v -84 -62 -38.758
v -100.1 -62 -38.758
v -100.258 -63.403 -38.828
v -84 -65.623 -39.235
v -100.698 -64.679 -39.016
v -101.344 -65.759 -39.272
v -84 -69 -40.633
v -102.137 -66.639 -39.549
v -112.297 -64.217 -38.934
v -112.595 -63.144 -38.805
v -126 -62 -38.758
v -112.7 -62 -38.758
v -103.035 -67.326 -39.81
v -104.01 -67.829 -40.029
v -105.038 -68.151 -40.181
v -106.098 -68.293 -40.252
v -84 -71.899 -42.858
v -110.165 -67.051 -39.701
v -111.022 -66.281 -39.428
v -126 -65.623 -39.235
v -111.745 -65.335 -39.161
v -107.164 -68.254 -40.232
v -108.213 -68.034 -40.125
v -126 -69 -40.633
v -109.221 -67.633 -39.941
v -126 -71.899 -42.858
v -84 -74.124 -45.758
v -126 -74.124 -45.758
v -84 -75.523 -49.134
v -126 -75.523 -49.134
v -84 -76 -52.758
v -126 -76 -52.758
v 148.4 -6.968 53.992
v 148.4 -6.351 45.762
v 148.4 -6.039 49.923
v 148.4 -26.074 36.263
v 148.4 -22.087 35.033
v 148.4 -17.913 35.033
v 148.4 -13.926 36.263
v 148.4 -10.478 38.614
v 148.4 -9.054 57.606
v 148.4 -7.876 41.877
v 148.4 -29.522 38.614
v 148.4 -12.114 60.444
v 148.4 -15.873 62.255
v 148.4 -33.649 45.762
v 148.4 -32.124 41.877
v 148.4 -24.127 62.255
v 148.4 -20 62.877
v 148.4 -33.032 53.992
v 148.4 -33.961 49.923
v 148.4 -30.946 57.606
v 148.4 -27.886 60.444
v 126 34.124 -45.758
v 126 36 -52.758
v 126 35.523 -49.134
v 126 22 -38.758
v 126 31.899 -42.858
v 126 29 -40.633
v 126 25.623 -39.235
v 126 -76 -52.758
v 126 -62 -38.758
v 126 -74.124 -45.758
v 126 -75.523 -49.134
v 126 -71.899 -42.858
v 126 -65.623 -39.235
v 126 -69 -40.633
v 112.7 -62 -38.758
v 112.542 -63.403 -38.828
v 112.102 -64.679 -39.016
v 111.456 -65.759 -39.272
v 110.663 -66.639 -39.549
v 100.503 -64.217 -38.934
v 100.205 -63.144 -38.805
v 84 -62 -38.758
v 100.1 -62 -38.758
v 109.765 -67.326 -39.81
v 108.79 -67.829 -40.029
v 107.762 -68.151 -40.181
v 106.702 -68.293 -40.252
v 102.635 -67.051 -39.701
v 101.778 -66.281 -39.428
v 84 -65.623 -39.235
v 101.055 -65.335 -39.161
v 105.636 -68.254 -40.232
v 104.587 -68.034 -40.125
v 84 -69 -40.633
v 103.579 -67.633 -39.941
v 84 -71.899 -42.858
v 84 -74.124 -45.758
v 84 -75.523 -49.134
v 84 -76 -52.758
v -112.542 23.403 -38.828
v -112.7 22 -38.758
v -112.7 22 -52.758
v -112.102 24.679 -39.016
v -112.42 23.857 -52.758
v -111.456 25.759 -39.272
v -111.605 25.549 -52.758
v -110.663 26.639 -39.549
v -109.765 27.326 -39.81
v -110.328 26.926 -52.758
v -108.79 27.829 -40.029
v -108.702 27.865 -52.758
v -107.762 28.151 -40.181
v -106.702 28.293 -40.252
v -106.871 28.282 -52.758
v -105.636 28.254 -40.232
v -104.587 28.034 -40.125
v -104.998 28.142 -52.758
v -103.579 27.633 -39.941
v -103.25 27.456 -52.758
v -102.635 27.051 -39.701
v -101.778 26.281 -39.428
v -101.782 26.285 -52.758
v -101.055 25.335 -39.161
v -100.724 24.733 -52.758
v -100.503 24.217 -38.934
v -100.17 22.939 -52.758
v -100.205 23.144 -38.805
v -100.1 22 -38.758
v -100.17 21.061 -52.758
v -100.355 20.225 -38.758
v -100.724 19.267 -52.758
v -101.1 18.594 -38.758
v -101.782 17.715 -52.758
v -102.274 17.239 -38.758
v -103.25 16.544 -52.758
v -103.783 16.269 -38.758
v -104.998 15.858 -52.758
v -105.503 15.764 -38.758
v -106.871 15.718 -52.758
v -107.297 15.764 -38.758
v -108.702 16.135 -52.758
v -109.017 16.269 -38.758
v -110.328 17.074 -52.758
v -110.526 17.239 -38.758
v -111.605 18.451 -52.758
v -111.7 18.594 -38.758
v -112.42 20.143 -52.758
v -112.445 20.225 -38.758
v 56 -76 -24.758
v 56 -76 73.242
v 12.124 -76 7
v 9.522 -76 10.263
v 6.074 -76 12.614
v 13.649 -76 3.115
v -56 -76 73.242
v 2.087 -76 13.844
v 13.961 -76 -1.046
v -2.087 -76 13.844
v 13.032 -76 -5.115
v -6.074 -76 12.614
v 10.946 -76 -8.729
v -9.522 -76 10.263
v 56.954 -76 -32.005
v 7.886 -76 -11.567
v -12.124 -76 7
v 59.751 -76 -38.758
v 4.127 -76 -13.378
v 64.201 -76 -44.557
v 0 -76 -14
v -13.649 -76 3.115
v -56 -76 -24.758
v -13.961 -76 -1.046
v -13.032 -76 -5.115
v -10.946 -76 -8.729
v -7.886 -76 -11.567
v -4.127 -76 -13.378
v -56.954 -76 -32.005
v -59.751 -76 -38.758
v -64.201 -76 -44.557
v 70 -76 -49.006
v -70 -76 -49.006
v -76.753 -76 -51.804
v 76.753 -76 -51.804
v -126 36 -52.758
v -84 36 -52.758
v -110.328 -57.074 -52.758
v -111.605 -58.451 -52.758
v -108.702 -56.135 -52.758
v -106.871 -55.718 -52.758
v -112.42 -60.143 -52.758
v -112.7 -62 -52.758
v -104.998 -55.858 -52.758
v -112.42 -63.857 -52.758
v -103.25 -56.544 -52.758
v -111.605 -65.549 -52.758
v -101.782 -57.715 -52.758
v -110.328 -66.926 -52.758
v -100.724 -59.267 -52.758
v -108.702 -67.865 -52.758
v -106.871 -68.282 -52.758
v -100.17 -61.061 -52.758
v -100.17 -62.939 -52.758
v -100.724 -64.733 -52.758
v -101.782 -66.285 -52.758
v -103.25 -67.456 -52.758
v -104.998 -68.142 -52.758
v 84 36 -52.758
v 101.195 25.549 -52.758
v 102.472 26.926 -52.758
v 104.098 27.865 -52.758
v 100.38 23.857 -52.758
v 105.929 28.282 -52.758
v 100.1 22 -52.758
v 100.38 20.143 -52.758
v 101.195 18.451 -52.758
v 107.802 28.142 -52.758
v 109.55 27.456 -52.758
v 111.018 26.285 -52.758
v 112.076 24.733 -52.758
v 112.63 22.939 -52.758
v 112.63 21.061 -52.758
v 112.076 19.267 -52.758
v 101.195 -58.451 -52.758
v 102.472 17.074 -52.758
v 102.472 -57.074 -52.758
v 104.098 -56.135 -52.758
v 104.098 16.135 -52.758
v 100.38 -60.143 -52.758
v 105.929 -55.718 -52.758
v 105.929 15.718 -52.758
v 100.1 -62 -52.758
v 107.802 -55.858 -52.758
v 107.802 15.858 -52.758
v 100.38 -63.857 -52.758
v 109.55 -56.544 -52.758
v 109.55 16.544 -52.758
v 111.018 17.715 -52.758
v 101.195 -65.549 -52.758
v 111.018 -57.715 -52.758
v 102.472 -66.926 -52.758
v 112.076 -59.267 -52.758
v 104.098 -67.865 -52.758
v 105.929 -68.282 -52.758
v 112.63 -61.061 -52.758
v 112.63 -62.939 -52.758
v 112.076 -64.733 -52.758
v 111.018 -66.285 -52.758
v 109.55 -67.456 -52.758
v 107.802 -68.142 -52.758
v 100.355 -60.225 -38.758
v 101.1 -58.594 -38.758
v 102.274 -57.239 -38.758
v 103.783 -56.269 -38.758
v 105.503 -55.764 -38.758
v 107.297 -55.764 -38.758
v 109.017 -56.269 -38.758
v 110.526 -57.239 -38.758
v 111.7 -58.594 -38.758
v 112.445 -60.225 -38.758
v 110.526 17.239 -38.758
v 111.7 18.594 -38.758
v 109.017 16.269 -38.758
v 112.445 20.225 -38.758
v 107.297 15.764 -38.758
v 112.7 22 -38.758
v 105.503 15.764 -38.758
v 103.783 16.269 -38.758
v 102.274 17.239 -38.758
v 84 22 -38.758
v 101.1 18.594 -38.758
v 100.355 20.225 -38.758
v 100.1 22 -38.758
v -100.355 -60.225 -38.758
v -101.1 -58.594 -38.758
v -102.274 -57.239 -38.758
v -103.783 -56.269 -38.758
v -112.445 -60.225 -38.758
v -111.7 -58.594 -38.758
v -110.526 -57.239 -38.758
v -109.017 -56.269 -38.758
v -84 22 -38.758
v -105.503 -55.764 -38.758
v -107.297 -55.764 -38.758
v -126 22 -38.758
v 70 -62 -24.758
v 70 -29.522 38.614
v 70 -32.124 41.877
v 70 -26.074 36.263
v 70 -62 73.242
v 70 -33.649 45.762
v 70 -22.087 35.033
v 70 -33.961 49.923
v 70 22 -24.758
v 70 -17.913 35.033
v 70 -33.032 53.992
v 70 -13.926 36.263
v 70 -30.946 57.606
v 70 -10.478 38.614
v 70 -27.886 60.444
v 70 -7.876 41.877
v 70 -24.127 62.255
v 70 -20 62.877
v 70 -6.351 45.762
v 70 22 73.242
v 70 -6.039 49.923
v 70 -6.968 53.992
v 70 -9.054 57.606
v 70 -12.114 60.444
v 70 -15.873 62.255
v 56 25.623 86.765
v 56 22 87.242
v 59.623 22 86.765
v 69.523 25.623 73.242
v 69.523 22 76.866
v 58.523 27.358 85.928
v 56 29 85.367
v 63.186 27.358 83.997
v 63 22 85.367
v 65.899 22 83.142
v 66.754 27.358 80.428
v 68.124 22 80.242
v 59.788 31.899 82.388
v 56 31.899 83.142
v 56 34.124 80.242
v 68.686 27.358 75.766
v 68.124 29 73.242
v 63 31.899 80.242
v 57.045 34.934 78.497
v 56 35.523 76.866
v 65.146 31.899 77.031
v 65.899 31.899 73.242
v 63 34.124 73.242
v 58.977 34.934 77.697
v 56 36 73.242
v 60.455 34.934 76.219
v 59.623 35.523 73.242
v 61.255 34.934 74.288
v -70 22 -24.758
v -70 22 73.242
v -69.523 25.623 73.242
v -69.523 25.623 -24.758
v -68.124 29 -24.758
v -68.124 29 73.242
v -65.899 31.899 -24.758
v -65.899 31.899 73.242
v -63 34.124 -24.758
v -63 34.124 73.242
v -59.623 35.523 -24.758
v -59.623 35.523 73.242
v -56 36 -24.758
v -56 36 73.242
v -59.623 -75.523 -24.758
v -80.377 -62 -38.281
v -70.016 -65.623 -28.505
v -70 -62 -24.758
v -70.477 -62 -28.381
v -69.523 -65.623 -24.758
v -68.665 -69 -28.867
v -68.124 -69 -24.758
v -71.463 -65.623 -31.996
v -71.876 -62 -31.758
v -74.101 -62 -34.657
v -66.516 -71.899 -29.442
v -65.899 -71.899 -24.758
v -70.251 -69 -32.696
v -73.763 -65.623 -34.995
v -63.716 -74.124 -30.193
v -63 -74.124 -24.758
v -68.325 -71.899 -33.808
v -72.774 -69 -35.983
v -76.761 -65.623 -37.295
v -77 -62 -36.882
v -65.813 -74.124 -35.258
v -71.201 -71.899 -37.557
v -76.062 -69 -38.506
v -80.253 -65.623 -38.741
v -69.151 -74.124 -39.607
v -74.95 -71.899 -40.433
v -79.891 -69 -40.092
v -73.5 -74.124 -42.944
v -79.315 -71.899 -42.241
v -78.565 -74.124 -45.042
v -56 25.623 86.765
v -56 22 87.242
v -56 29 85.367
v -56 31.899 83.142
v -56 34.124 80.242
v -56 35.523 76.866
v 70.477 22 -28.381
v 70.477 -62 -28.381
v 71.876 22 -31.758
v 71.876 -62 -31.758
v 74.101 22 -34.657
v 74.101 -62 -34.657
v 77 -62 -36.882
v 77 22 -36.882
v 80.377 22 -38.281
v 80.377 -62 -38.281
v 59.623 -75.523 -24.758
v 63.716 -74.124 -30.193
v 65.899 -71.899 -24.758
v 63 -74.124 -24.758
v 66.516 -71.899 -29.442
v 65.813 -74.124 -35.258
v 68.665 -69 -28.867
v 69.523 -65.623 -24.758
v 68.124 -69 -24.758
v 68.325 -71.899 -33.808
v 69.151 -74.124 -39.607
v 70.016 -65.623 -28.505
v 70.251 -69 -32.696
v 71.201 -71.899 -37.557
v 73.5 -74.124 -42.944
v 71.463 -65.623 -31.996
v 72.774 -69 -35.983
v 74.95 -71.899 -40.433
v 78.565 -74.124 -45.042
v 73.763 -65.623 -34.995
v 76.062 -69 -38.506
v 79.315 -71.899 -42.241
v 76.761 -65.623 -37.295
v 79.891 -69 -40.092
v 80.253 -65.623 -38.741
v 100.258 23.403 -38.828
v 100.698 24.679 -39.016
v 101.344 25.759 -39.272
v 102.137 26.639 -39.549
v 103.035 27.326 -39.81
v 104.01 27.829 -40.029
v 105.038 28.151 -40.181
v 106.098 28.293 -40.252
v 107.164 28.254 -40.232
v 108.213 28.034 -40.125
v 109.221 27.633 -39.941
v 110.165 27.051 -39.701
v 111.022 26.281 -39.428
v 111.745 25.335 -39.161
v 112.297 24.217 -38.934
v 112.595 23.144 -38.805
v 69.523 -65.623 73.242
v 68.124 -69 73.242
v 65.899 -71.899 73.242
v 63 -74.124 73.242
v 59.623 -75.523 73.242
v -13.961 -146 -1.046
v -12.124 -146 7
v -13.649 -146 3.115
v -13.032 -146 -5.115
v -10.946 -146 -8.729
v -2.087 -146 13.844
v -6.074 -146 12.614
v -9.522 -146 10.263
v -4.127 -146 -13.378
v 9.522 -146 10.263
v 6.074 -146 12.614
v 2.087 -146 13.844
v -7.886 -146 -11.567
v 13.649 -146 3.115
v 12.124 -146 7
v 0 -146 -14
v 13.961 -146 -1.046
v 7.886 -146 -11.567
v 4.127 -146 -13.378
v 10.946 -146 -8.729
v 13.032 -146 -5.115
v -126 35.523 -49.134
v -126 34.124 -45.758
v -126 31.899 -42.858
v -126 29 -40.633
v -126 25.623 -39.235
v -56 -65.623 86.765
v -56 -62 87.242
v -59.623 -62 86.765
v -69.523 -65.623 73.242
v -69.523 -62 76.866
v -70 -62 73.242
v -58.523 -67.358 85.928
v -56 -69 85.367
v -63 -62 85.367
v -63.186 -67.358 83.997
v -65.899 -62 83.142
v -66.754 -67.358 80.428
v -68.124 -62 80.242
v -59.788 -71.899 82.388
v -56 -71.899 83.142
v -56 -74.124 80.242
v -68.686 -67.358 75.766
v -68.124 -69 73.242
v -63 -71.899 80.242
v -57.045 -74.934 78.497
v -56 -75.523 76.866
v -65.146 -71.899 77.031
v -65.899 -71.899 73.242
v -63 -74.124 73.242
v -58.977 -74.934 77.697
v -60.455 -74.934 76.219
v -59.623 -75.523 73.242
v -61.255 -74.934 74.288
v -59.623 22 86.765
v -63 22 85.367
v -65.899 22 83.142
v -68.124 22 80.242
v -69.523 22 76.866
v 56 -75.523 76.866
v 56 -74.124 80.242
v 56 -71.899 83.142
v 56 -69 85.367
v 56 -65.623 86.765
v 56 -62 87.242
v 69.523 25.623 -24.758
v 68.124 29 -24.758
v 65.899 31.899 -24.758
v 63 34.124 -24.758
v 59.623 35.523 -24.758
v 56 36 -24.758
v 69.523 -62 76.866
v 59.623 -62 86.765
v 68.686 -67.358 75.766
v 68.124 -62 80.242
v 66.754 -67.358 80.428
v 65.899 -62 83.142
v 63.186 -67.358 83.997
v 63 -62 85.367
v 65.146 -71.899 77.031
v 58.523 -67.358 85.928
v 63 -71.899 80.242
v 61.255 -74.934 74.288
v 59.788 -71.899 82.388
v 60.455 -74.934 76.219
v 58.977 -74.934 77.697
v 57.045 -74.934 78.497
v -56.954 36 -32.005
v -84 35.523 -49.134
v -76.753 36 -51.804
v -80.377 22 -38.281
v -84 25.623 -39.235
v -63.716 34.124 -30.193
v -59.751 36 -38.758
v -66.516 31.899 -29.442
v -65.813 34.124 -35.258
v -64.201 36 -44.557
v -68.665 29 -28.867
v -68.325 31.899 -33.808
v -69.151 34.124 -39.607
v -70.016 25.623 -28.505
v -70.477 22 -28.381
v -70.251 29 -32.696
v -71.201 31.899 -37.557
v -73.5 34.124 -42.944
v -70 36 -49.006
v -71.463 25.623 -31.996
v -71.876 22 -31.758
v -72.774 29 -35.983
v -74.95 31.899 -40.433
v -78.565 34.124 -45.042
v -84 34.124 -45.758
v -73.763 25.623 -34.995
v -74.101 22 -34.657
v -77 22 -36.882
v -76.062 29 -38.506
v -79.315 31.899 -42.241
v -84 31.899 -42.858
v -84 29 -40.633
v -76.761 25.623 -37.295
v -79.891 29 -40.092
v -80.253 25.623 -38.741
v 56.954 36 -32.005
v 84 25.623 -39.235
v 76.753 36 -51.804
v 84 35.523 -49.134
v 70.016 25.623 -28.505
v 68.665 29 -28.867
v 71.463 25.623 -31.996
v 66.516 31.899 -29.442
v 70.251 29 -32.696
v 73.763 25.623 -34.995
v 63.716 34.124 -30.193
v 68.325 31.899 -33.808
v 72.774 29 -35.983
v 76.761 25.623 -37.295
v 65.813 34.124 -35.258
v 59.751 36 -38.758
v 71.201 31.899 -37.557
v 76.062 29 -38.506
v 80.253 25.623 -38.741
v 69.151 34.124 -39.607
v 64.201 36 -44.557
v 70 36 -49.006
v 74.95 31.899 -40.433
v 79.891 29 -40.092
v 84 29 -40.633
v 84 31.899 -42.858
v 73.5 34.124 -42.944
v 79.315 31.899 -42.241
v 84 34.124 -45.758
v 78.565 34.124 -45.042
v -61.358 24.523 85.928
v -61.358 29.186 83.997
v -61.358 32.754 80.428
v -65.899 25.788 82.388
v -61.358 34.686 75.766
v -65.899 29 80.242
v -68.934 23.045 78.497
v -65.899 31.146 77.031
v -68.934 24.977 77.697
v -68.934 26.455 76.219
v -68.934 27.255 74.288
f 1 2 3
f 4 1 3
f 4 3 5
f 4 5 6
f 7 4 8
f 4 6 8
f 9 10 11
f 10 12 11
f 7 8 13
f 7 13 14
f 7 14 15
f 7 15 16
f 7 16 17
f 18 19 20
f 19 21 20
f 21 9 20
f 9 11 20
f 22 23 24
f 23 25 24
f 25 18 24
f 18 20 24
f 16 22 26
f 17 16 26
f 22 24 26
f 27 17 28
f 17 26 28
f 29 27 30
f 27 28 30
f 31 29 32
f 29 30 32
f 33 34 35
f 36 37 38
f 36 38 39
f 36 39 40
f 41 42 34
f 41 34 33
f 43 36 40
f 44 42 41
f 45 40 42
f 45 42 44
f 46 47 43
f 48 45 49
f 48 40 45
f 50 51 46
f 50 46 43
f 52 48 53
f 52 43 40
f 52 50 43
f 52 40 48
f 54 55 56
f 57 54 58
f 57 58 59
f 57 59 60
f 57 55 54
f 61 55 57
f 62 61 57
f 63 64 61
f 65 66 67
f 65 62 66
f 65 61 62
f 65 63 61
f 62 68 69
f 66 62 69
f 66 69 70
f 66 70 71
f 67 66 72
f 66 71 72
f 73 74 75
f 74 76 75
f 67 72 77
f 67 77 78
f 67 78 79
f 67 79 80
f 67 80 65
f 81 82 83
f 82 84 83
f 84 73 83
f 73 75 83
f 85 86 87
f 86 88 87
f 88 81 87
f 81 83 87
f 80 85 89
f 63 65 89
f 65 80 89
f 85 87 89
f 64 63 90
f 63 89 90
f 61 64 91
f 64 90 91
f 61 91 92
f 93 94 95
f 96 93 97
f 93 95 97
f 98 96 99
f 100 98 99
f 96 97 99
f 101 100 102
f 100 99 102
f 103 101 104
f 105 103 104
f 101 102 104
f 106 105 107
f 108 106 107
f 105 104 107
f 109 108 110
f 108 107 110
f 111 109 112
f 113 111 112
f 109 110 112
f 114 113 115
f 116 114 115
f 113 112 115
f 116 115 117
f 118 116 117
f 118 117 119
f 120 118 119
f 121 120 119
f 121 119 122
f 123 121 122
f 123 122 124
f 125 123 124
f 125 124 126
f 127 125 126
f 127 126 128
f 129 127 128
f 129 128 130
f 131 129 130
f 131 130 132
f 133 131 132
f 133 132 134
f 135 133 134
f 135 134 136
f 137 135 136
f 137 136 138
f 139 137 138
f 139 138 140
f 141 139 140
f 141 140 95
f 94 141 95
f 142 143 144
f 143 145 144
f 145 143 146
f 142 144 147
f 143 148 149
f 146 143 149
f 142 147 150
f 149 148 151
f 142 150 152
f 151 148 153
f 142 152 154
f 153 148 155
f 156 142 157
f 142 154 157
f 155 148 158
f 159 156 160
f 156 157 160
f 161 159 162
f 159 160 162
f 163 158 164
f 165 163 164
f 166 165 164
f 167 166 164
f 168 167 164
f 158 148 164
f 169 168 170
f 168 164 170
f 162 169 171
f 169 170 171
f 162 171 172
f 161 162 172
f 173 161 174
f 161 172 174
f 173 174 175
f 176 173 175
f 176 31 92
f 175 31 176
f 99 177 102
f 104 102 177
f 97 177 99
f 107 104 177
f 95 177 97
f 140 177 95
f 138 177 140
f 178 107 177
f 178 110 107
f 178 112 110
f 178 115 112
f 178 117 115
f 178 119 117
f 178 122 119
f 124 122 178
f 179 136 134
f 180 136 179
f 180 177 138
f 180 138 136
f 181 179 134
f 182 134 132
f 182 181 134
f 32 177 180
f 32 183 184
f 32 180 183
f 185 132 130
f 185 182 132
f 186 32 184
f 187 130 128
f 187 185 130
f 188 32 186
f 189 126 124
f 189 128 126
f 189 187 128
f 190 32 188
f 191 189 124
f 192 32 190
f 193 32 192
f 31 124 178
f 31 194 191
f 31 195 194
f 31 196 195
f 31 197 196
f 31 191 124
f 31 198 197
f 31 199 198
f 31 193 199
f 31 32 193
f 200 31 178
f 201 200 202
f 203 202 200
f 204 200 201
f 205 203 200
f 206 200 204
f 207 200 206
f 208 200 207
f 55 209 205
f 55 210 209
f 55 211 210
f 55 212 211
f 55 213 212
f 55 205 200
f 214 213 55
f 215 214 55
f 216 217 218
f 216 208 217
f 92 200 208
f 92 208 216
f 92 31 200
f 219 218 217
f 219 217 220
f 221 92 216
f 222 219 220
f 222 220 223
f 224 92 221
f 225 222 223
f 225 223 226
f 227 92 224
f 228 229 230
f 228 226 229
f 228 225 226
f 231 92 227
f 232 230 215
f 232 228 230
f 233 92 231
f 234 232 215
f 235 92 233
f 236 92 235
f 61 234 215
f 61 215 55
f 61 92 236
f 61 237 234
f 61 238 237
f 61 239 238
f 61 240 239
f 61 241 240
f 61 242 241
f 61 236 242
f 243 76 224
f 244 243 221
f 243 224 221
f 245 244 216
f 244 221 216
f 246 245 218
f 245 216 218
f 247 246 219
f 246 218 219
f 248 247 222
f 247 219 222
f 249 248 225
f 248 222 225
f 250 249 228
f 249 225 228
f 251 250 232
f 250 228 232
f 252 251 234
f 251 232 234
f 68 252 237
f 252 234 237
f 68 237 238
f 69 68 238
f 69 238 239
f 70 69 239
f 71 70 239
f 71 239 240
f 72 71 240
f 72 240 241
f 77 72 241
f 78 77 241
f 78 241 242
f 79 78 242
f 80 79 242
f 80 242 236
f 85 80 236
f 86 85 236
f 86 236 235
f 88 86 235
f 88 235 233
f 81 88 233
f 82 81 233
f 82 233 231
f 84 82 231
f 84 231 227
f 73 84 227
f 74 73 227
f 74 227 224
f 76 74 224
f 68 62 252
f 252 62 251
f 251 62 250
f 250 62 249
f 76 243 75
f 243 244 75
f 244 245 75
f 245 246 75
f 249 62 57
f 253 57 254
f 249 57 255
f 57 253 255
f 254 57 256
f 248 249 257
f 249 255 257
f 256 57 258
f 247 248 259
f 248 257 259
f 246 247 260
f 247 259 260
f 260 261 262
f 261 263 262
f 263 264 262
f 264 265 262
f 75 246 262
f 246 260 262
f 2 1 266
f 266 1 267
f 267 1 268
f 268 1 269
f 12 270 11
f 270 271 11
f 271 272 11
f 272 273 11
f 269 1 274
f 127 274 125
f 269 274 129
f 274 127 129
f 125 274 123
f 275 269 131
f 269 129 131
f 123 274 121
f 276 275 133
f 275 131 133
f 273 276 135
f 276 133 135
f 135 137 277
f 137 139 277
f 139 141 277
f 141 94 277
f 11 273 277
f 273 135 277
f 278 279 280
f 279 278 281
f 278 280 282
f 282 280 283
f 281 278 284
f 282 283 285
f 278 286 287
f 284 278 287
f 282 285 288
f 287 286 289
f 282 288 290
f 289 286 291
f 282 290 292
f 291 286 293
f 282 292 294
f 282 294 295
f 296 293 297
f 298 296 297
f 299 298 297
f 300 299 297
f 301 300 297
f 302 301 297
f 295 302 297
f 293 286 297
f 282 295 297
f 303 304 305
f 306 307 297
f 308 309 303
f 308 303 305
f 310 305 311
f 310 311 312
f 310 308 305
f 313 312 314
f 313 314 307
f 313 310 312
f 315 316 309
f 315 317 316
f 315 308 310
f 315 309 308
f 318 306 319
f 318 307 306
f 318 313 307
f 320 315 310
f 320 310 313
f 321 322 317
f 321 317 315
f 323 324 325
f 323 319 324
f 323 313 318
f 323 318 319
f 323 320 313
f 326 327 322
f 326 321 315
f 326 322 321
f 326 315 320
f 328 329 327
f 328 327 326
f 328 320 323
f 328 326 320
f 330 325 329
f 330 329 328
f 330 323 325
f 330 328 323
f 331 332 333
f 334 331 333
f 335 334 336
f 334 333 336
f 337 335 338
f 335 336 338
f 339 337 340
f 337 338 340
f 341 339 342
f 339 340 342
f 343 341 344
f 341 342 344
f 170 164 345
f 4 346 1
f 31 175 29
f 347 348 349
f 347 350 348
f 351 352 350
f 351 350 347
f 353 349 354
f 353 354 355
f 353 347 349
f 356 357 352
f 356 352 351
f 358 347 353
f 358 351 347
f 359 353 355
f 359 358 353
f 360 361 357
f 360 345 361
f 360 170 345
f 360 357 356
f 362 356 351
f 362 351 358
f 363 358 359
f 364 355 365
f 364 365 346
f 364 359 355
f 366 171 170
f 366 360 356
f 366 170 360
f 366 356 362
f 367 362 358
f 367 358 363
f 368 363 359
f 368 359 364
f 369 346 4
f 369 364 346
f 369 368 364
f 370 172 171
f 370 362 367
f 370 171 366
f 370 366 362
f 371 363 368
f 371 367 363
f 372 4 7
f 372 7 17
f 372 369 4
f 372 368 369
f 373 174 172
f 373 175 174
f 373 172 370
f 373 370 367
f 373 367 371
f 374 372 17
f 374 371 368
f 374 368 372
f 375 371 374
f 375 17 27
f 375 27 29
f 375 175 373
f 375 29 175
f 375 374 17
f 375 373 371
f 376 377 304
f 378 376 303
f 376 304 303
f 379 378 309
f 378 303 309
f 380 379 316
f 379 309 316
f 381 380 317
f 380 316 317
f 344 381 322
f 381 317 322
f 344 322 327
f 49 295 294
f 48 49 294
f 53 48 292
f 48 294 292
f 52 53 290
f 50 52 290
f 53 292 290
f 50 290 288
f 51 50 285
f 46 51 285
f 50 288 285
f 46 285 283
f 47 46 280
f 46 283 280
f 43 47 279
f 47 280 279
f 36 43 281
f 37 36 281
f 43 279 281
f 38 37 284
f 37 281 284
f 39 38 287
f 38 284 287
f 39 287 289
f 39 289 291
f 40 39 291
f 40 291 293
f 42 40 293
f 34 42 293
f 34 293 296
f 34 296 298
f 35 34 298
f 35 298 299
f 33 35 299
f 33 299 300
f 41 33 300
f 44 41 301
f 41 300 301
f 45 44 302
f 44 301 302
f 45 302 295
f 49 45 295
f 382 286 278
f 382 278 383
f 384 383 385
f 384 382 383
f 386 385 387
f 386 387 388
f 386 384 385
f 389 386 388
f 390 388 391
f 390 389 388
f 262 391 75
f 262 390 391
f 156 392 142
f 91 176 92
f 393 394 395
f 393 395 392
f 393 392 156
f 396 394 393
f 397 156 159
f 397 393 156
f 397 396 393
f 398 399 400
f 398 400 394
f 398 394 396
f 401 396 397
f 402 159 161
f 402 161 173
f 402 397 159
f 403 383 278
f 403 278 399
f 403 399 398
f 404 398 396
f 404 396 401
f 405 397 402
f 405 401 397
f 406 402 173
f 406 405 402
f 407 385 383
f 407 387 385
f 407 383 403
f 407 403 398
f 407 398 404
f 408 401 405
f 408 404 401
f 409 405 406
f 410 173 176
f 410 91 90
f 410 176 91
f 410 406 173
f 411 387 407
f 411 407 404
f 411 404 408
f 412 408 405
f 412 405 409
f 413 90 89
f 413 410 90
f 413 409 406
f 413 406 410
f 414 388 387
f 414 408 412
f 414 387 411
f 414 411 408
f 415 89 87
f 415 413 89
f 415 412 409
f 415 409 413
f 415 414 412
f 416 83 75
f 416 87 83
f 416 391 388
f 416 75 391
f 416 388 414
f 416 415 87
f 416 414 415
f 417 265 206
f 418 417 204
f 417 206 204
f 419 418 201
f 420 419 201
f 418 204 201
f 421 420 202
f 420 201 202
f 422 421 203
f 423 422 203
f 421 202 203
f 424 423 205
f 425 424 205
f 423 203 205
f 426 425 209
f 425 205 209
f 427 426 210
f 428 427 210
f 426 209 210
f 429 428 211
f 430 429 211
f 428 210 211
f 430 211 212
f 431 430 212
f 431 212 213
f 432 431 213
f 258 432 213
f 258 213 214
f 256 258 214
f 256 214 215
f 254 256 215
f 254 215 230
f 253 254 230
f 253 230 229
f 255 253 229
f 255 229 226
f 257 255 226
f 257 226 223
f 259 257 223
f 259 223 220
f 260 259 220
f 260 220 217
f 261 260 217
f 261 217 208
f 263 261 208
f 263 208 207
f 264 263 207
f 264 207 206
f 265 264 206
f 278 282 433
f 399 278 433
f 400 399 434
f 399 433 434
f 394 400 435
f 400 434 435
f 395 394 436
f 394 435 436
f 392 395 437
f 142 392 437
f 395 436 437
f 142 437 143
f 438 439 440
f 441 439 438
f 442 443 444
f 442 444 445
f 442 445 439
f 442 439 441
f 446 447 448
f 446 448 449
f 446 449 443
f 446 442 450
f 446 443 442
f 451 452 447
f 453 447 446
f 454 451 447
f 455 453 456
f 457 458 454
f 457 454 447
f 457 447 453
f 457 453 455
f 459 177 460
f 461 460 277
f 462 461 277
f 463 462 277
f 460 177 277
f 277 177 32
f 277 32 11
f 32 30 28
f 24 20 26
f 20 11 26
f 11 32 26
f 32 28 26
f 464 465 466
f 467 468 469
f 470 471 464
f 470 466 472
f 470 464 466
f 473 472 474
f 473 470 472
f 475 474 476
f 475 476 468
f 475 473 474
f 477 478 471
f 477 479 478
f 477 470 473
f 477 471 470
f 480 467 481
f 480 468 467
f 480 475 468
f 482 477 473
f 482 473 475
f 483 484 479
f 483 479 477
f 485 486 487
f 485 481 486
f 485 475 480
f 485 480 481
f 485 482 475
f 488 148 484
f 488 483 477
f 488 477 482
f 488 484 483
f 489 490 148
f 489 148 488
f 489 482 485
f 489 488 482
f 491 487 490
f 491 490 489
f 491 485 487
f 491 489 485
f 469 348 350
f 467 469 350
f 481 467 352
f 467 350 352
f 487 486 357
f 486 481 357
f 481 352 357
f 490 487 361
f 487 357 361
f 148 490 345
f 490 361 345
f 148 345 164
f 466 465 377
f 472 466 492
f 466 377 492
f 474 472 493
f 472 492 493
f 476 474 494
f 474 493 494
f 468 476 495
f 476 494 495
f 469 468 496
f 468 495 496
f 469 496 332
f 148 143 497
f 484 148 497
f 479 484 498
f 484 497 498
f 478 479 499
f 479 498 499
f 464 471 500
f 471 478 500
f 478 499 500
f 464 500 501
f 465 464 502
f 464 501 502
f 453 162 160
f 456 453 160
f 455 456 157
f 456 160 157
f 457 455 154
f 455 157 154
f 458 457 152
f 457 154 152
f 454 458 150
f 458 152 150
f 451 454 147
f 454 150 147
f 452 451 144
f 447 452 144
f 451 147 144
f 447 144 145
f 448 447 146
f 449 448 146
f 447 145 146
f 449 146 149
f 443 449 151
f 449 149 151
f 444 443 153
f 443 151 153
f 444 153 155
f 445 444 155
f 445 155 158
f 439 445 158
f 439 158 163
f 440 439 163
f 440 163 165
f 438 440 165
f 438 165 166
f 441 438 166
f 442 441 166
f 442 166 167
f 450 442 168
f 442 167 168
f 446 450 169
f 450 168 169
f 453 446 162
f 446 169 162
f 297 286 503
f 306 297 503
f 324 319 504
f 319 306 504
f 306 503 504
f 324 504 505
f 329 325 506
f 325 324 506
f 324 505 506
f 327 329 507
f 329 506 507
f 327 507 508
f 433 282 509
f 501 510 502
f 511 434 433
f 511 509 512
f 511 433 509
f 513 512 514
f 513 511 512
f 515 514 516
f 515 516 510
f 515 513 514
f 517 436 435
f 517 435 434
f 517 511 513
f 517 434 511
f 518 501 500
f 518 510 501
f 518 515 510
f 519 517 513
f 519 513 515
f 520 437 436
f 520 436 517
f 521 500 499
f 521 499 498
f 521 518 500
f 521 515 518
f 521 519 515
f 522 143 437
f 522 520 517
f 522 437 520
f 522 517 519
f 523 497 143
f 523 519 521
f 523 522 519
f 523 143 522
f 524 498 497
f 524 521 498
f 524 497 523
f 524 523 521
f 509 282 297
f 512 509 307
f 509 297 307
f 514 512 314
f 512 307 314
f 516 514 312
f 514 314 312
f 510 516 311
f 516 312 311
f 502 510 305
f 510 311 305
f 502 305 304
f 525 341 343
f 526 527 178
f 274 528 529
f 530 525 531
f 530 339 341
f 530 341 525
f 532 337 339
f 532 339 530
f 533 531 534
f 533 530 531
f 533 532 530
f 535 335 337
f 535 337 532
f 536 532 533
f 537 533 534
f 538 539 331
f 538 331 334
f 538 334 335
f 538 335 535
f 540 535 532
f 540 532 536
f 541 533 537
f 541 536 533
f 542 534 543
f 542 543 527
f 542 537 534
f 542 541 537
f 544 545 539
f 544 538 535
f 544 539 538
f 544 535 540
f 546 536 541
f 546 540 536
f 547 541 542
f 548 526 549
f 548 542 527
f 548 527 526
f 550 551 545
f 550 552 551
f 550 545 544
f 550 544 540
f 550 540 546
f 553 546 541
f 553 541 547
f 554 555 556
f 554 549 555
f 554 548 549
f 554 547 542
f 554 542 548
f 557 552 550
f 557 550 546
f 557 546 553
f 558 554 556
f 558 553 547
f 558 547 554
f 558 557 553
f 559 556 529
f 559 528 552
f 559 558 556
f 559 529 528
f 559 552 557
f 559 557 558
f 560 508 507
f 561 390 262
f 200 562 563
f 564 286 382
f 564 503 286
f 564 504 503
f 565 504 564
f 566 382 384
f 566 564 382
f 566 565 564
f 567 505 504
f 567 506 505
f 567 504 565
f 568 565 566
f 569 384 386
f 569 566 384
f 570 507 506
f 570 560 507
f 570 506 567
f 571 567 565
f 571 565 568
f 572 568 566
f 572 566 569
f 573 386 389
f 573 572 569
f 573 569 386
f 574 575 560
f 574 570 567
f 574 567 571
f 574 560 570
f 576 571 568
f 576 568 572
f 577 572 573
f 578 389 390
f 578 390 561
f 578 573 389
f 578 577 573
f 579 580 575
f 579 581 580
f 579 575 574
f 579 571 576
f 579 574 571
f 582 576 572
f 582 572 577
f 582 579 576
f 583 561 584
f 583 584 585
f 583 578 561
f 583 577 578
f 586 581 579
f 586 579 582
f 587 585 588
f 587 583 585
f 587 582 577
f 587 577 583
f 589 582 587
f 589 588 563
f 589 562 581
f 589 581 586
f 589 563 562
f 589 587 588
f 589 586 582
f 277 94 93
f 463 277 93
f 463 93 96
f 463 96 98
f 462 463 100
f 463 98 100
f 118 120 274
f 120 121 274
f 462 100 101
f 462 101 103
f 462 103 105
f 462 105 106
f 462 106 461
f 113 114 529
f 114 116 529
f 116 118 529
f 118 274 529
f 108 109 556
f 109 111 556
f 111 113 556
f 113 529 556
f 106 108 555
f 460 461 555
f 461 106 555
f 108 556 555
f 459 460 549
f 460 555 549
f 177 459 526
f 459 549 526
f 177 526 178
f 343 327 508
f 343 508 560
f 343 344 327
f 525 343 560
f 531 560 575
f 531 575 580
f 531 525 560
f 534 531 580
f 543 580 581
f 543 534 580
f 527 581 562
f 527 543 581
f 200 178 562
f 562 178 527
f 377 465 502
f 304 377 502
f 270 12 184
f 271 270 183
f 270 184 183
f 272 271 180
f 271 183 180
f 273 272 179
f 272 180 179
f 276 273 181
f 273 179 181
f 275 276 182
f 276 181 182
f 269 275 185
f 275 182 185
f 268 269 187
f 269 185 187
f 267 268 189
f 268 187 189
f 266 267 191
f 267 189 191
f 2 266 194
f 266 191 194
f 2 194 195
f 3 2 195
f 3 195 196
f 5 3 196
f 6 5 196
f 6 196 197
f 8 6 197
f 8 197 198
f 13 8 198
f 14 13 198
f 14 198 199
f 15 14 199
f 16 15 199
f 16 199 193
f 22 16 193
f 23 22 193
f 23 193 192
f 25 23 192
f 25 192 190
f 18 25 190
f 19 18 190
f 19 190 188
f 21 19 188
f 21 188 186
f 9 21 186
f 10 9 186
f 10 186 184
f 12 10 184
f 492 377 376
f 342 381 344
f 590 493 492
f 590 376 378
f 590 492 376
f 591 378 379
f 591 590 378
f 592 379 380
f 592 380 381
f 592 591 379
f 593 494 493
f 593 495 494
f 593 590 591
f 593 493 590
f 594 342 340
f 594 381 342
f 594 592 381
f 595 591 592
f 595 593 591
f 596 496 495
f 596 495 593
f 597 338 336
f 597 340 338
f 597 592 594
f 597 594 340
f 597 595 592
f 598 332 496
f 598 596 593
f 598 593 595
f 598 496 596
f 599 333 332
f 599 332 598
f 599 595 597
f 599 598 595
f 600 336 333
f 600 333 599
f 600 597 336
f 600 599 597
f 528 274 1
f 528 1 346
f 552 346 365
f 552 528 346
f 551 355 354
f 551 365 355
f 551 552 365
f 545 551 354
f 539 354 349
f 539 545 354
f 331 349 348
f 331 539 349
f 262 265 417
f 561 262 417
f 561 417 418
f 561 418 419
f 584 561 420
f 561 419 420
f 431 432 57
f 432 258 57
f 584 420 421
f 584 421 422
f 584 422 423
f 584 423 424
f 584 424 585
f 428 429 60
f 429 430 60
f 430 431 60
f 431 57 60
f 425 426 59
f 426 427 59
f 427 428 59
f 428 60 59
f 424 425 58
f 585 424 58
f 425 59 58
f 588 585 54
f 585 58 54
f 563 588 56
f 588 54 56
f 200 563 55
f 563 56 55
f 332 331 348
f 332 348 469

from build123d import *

# Parameters (mm, degrees)
SKETCH1_W                  = 90
SKETCH1_H                  = 50
BOSS_EXTRUDE1_DEPTH        = 40
SKETCH2_W                  = 20
SKETCH2_H                  = 45
CUT_EXTRUDE1_DEPTH         = 72.689445415
SKETCH3_W                  = 20
SKETCH3_H                  = 45
CUT_EXTRUDE2_DEPTH         = 72.689445415
F_4_5_4_5_DIAMETER_HOLE1_D = 4.5
FILLET1_R                  = 5
SCALE1_SCALE               = 2.8
SKETCH12_R                 = 14
BOSS_EXTRUDE2_DEPTH        = 70
SKETCH13_R                 = 14
BOSS_EXTRUDE3_DEPTH        = 78.4


with BuildPart() as part:
    # Sketch1 → Boss-Extrude1 (new body)
    with BuildSketch(Plane.XZ.offset(40)):
        with Locations((0, 13.914991763)):
            Rectangle(SKETCH1_W, SKETCH1_H)
    extrude(amount=-BOSS_EXTRUDE1_DEPTH)

    # Sketch2 → Cut-Extrude1 (cut, through all)
    with BuildSketch(Plane(origin=(0, 0, 0), x_dir=(-1, 0, 0), z_dir=(0, 1, 0))):
        with Locations((35, 16.414991763)):
            Rectangle(SKETCH2_W, SKETCH2_H)
    extrude(amount=-CUT_EXTRUDE1_DEPTH, mode=Mode.SUBTRACT)

    # Sketch3 → Cut-Extrude2 (cut, through all)
    with BuildSketch(Plane(origin=(0, 0, 0), x_dir=(-1, 0, 0), z_dir=(0, 1, 0))):
        with Locations((-35, 16.414991763)):
            Rectangle(SKETCH3_W, SKETCH3_H)
    extrude(amount=-CUT_EXTRUDE2_DEPTH, mode=Mode.SUBTRACT)

    # Ø4.5 (4.5) Diameter Hole1 (through all)
    with Locations(Plane.XY.offset(-6.085008237)):
        with Locations((38, -5), (-38, -35), (-38, -5), (38, -35)):
            Hole(F_4_5_4_5_DIAMETER_HOLE1_D / 2)

    # Fillet1
    # the kernel refuses this fillet: 5 mm, written as the material it adds along each edge
    with BuildSketch(Plane(origin=(-25, 0, -6.085008237), x_dir=(0, 0, 1), z_dir=(0, -1, 0))) as fillet1_piece_1:
        with BuildLine():
            CenterArc((FILLET1_R, FILLET1_R), FILLET1_R, 180, 90)
            Line((0, FILLET1_R), (0, 0))
            Line((0, 0), (FILLET1_R, 0))
        make_face()
    extrude(amount=40)
    with BuildSketch(Plane(origin=(25, 0, -6.085008237), x_dir=(0, 0, 1), z_dir=(0, -1, 0))) as fillet1_piece_2:
        with BuildLine():
            CenterArc((FILLET1_R, -FILLET1_R), FILLET1_R, 90, 90)
            Line((0, -FILLET1_R), (0, 0))
            Line((0, 0), (FILLET1_R, 0))
        make_face()
    extrude(amount=40)
    # the kernel refuses this fillet: 5 mm, written as the material it takes off along each edge
    with BuildSketch(Plane(origin=(-25, 12.5, 38.914991763), x_dir=(1, 0, 0), z_dir=(0, -1, 0))) as fillet1_2_piece_1:
        with BuildLine():
            CenterArc((FILLET1_R, -FILLET1_R), FILLET1_R, 90, 90)
            Line((0, -FILLET1_R), (0, 0))
            Line((0, 0), (FILLET1_R, 0))
        make_face()
    extrude(amount=65, mode=Mode.SUBTRACT)
    with BuildSketch(Plane(origin=(37.5, 0, 38.914991763), x_dir=(0, -1, 0), z_dir=(-1, 0, 0))) as fillet1_2_piece_2:
        with BuildLine():
            CenterArc((FILLET1_R, -FILLET1_R), FILLET1_R, 90, 90)
            Line((0, -FILLET1_R), (0, 0))
            Line((0, 0), (FILLET1_R, 0))
        make_face()
    extrude(amount=75, mode=Mode.SUBTRACT)
    with BuildSketch(Plane(origin=(37.5, -40, 38.914991763), x_dir=(0, 1, 0), z_dir=(-1, 0, 0))) as fillet1_2_piece_3:
        with BuildLine():
            CenterArc((FILLET1_R, FILLET1_R), FILLET1_R, 180, 90)
            Line((0, FILLET1_R), (0, 0))
            Line((0, 0), (FILLET1_R, 0))
        make_face()
    extrude(amount=75, mode=Mode.SUBTRACT)
    with BuildSketch(Plane(origin=(25, 12.5, 38.914991763), x_dir=(-1, 0, 0), z_dir=(0, -1, 0))) as fillet1_2_piece_4:
        with BuildLine():
            CenterArc((FILLET1_R, FILLET1_R), FILLET1_R, 180, 90)
            Line((0, FILLET1_R), (0, 0))
            Line((0, 0), (FILLET1_R, 0))
        make_face()
    extrude(amount=65, mode=Mode.SUBTRACT)
    # the kernel refuses this fillet: 5 mm, written as the material it takes off along each edge
    with BuildSketch(Plane(origin=(20, -35, 33.914991763), x_dir=(1, 0, 0), z_dir=(0, -1, 0))) as fillet1_3_piece_1_section:
        Polygon((0, 0), (FILLET1_R, 0), (FILLET1_R, FILLET1_R), (0, FILLET1_R), align=None)
    fillet1_3_piece_1 = extrude(amount=FILLET1_R, mode=Mode.PRIVATE)
    fillet1_3_piece_1 = fillet1_3_piece_1 - Plane(origin=(20, -35, 33.914991763), x_dir=(-0.7071067811865475, 0, -0.7071067811865475), z_dir=(0, -1, 0)) * Sphere(FILLET1_R, mode=Mode.PRIVATE)
    add(fillet1_3_piece_1, mode=Mode.SUBTRACT)
    with BuildSketch(Plane(origin=(-20, -35, 33.914991763), x_dir=(-1, 0, 0), z_dir=(0, -1, 0))) as fillet1_3_piece_2_section:
        Polygon((0, 0), (FILLET1_R, 0), (FILLET1_R, -FILLET1_R), (0, -FILLET1_R), align=None)
    fillet1_3_piece_2 = extrude(amount=FILLET1_R, mode=Mode.PRIVATE)
    fillet1_3_piece_2 = fillet1_3_piece_2 - Plane(origin=(-20, -35, 33.914991763), x_dir=(0.7071067811865476, 0, -0.7071067811865475), z_dir=(0, -1, 0)) * Sphere(FILLET1_R, mode=Mode.PRIVATE)
    add(fillet1_3_piece_2, mode=Mode.SUBTRACT)
    with BuildSketch(Plane(origin=(-20, -5, 33.914991763), x_dir=(0, 1, 0), z_dir=(-1, 0, 0))) as fillet1_3_piece_3_section:
        Polygon((0, 0), (FILLET1_R, 0), (FILLET1_R, -FILLET1_R), (0, -FILLET1_R), align=None)
    fillet1_3_piece_3 = extrude(amount=FILLET1_R, mode=Mode.PRIVATE)
    fillet1_3_piece_3 = fillet1_3_piece_3 - Plane(origin=(-20, -5, 33.914991763), x_dir=(0, -0.7071067811865475, -0.7071067811865475), z_dir=(-1, 0, 0)) * Sphere(FILLET1_R, mode=Mode.PRIVATE)
    add(fillet1_3_piece_3, mode=Mode.SUBTRACT)
    with BuildSketch(Plane(origin=(20, -5, 33.914991763), x_dir=(1, 0, 0), z_dir=(0, 1, 0))) as fillet1_3_piece_4_section:
        Polygon((0, 0), (FILLET1_R, 0), (FILLET1_R, -FILLET1_R), (0, -FILLET1_R), align=None)
    fillet1_3_piece_4 = extrude(amount=FILLET1_R, mode=Mode.PRIVATE)
    fillet1_3_piece_4 = fillet1_3_piece_4 - Plane(origin=(20, -5, 33.914991763), x_dir=(-0.7071067811865475, 0, -0.7071067811865475), z_dir=(0, 1, 0)) * Sphere(FILLET1_R, mode=Mode.PRIVATE)
    add(fillet1_3_piece_4, mode=Mode.SUBTRACT)
    with BuildSketch(Plane(origin=(-57.5, -40, -6.085008237), x_dir=(0, 0, -1), z_dir=(1, 0, 0)), Plane(origin=(-30, 0, -6.085008237), x_dir=(0, 0, -1), z_dir=(-1, 0, 0)), Plane(origin=(57.5, 0, -6.085008237), x_dir=(0, 0, -1), z_dir=(-1, 0, 0)), Plane(origin=(30, -40, -6.085008237), x_dir=(0, 0, -1), z_dir=(1, 0, 0))) as fillet1_3_piece_5:
        with BuildLine():
            CenterArc((FILLET1_R, FILLET1_R), FILLET1_R, 180, 90)
            Line((0, FILLET1_R), (0, 0))
            Line((0, 0), (FILLET1_R, 0))
        make_face()
    extrude(amount=27.5, mode=Mode.SUBTRACT)
    with BuildSketch(Plane(origin=(25, 0, -1.085008237), x_dir=(-1, 0, 0), z_dir=(0, 0, 1)), Plane(origin=(-25, -40, -1.085008237), x_dir=(1, 0, 0), z_dir=(0, 0, 1)), Plane(origin=(25, -40, 33.914991763), x_dir=(-1, 0, 0), z_dir=(0, 0, -1))) as fillet1_3_piece_6:
        with BuildLine():
            CenterArc((FILLET1_R, FILLET1_R), FILLET1_R, 180, 90)
            Line((0, FILLET1_R), (0, 0))
            Line((0, 0), (FILLET1_R, 0))
        make_face()
    extrude(amount=35, mode=Mode.SUBTRACT)
    with BuildSketch(Plane(origin=(-25, 0, 33.914991763), x_dir=(0, -1, 0), z_dir=(0, 0, -1))) as fillet1_3_piece_7:
        with BuildLine():
            CenterArc((FILLET1_R, -FILLET1_R), FILLET1_R, 90, 90)
            Line((0, -FILLET1_R), (0, 0))
            Line((0, 0), (FILLET1_R, 0))
        make_face()
    extrude(amount=35, mode=Mode.SUBTRACT)
    with BuildSketch(Plane(origin=(30, -40, -1.085008237), x_dir=(-1, 0, 0), z_dir=(0, 0, 1))) as fillet1_3_piece_8:
        with BuildLine():
            CenterArc((5 + FILLET1_R, -FILLET1_R), FILLET1_R, 90, 90)
            Line((5, -FILLET1_R), (5, 0))
            Line((5, 0), (5 + FILLET1_R, 0))
        make_face()
    revolve(axis=Axis((30, -40, -1.085008237), (0, -1, 0)), revolution_arc=90, mode=Mode.SUBTRACT)
    with BuildSketch(Plane(origin=(-30, -40, -1.085008237), x_dir=(1, 0, 0), z_dir=(0, 0, 1))) as fillet1_3_piece_9:
        with BuildLine():
            CenterArc((5 + FILLET1_R, FILLET1_R), FILLET1_R, 180, 90)
            Line((5, FILLET1_R), (5, 0))
            Line((5, 0), (5 + FILLET1_R, 0))
        make_face()
    revolve(axis=Axis((-30, -40, -1.085008237), (0, 1, 0)), revolution_arc=90, mode=Mode.SUBTRACT)
    with BuildSketch(Plane(origin=(-30, 0, -1.085008237), x_dir=(1, 0, 0), z_dir=(0, 0, 1))) as fillet1_3_piece_10:
        with BuildLine():
            CenterArc((5 + FILLET1_R, -FILLET1_R), FILLET1_R, 90, 90)
            Line((5, -FILLET1_R), (5, 0))
            Line((5, 0), (5 + FILLET1_R, 0))
        make_face()
    revolve(axis=Axis((-30, 0, -1.085008237), (0, 1, 0)), revolution_arc=90, mode=Mode.SUBTRACT)
    with BuildSketch(Plane(origin=(30, 0, -1.085008237), x_dir=(-1, 0, 0), z_dir=(0, 0, 1))) as fillet1_3_piece_11:
        with BuildLine():
            CenterArc((5 + FILLET1_R, FILLET1_R), FILLET1_R, 180, 90)
            Line((5, FILLET1_R), (5, 0))
            Line((5, 0), (5 + FILLET1_R, 0))
        make_face()
    revolve(axis=Axis((30, 0, -1.085008237), (0, -1, 0)), revolution_arc=90, mode=Mode.SUBTRACT)


with BuildPart() as part_1:
    # Scale1: scaled about (-1e-09, -20.000000005, 12.066484994)
    add(part.part.scale(SCALE1_SCALE).moved(Location((2e-09, 36.000000009, -21.719672989))))

    # Sketch12 → Boss-Extrude2 (add)
    with BuildSketch(Plane.XZ.offset(76)):
        with Locations(Location((0, 0, 0), (0, 0, 270))):
            Circle(SKETCH12_R)
    extrude(amount=BOSS_EXTRUDE2_DEPTH)

    # Sketch13 → Boss-Extrude3 (add)
    with BuildSketch(Plane(origin=(70, 0, 0), x_dir=(0, 0, -1), z_dir=(1, 0, 0))):
        with Locations(Location((-48.876838431, -20, 0), (0, 0, 180))):
            Circle(SKETCH13_R)
    extrude(amount=BOSS_EXTRUDE3_DEPTH)


solid = part_1.part
